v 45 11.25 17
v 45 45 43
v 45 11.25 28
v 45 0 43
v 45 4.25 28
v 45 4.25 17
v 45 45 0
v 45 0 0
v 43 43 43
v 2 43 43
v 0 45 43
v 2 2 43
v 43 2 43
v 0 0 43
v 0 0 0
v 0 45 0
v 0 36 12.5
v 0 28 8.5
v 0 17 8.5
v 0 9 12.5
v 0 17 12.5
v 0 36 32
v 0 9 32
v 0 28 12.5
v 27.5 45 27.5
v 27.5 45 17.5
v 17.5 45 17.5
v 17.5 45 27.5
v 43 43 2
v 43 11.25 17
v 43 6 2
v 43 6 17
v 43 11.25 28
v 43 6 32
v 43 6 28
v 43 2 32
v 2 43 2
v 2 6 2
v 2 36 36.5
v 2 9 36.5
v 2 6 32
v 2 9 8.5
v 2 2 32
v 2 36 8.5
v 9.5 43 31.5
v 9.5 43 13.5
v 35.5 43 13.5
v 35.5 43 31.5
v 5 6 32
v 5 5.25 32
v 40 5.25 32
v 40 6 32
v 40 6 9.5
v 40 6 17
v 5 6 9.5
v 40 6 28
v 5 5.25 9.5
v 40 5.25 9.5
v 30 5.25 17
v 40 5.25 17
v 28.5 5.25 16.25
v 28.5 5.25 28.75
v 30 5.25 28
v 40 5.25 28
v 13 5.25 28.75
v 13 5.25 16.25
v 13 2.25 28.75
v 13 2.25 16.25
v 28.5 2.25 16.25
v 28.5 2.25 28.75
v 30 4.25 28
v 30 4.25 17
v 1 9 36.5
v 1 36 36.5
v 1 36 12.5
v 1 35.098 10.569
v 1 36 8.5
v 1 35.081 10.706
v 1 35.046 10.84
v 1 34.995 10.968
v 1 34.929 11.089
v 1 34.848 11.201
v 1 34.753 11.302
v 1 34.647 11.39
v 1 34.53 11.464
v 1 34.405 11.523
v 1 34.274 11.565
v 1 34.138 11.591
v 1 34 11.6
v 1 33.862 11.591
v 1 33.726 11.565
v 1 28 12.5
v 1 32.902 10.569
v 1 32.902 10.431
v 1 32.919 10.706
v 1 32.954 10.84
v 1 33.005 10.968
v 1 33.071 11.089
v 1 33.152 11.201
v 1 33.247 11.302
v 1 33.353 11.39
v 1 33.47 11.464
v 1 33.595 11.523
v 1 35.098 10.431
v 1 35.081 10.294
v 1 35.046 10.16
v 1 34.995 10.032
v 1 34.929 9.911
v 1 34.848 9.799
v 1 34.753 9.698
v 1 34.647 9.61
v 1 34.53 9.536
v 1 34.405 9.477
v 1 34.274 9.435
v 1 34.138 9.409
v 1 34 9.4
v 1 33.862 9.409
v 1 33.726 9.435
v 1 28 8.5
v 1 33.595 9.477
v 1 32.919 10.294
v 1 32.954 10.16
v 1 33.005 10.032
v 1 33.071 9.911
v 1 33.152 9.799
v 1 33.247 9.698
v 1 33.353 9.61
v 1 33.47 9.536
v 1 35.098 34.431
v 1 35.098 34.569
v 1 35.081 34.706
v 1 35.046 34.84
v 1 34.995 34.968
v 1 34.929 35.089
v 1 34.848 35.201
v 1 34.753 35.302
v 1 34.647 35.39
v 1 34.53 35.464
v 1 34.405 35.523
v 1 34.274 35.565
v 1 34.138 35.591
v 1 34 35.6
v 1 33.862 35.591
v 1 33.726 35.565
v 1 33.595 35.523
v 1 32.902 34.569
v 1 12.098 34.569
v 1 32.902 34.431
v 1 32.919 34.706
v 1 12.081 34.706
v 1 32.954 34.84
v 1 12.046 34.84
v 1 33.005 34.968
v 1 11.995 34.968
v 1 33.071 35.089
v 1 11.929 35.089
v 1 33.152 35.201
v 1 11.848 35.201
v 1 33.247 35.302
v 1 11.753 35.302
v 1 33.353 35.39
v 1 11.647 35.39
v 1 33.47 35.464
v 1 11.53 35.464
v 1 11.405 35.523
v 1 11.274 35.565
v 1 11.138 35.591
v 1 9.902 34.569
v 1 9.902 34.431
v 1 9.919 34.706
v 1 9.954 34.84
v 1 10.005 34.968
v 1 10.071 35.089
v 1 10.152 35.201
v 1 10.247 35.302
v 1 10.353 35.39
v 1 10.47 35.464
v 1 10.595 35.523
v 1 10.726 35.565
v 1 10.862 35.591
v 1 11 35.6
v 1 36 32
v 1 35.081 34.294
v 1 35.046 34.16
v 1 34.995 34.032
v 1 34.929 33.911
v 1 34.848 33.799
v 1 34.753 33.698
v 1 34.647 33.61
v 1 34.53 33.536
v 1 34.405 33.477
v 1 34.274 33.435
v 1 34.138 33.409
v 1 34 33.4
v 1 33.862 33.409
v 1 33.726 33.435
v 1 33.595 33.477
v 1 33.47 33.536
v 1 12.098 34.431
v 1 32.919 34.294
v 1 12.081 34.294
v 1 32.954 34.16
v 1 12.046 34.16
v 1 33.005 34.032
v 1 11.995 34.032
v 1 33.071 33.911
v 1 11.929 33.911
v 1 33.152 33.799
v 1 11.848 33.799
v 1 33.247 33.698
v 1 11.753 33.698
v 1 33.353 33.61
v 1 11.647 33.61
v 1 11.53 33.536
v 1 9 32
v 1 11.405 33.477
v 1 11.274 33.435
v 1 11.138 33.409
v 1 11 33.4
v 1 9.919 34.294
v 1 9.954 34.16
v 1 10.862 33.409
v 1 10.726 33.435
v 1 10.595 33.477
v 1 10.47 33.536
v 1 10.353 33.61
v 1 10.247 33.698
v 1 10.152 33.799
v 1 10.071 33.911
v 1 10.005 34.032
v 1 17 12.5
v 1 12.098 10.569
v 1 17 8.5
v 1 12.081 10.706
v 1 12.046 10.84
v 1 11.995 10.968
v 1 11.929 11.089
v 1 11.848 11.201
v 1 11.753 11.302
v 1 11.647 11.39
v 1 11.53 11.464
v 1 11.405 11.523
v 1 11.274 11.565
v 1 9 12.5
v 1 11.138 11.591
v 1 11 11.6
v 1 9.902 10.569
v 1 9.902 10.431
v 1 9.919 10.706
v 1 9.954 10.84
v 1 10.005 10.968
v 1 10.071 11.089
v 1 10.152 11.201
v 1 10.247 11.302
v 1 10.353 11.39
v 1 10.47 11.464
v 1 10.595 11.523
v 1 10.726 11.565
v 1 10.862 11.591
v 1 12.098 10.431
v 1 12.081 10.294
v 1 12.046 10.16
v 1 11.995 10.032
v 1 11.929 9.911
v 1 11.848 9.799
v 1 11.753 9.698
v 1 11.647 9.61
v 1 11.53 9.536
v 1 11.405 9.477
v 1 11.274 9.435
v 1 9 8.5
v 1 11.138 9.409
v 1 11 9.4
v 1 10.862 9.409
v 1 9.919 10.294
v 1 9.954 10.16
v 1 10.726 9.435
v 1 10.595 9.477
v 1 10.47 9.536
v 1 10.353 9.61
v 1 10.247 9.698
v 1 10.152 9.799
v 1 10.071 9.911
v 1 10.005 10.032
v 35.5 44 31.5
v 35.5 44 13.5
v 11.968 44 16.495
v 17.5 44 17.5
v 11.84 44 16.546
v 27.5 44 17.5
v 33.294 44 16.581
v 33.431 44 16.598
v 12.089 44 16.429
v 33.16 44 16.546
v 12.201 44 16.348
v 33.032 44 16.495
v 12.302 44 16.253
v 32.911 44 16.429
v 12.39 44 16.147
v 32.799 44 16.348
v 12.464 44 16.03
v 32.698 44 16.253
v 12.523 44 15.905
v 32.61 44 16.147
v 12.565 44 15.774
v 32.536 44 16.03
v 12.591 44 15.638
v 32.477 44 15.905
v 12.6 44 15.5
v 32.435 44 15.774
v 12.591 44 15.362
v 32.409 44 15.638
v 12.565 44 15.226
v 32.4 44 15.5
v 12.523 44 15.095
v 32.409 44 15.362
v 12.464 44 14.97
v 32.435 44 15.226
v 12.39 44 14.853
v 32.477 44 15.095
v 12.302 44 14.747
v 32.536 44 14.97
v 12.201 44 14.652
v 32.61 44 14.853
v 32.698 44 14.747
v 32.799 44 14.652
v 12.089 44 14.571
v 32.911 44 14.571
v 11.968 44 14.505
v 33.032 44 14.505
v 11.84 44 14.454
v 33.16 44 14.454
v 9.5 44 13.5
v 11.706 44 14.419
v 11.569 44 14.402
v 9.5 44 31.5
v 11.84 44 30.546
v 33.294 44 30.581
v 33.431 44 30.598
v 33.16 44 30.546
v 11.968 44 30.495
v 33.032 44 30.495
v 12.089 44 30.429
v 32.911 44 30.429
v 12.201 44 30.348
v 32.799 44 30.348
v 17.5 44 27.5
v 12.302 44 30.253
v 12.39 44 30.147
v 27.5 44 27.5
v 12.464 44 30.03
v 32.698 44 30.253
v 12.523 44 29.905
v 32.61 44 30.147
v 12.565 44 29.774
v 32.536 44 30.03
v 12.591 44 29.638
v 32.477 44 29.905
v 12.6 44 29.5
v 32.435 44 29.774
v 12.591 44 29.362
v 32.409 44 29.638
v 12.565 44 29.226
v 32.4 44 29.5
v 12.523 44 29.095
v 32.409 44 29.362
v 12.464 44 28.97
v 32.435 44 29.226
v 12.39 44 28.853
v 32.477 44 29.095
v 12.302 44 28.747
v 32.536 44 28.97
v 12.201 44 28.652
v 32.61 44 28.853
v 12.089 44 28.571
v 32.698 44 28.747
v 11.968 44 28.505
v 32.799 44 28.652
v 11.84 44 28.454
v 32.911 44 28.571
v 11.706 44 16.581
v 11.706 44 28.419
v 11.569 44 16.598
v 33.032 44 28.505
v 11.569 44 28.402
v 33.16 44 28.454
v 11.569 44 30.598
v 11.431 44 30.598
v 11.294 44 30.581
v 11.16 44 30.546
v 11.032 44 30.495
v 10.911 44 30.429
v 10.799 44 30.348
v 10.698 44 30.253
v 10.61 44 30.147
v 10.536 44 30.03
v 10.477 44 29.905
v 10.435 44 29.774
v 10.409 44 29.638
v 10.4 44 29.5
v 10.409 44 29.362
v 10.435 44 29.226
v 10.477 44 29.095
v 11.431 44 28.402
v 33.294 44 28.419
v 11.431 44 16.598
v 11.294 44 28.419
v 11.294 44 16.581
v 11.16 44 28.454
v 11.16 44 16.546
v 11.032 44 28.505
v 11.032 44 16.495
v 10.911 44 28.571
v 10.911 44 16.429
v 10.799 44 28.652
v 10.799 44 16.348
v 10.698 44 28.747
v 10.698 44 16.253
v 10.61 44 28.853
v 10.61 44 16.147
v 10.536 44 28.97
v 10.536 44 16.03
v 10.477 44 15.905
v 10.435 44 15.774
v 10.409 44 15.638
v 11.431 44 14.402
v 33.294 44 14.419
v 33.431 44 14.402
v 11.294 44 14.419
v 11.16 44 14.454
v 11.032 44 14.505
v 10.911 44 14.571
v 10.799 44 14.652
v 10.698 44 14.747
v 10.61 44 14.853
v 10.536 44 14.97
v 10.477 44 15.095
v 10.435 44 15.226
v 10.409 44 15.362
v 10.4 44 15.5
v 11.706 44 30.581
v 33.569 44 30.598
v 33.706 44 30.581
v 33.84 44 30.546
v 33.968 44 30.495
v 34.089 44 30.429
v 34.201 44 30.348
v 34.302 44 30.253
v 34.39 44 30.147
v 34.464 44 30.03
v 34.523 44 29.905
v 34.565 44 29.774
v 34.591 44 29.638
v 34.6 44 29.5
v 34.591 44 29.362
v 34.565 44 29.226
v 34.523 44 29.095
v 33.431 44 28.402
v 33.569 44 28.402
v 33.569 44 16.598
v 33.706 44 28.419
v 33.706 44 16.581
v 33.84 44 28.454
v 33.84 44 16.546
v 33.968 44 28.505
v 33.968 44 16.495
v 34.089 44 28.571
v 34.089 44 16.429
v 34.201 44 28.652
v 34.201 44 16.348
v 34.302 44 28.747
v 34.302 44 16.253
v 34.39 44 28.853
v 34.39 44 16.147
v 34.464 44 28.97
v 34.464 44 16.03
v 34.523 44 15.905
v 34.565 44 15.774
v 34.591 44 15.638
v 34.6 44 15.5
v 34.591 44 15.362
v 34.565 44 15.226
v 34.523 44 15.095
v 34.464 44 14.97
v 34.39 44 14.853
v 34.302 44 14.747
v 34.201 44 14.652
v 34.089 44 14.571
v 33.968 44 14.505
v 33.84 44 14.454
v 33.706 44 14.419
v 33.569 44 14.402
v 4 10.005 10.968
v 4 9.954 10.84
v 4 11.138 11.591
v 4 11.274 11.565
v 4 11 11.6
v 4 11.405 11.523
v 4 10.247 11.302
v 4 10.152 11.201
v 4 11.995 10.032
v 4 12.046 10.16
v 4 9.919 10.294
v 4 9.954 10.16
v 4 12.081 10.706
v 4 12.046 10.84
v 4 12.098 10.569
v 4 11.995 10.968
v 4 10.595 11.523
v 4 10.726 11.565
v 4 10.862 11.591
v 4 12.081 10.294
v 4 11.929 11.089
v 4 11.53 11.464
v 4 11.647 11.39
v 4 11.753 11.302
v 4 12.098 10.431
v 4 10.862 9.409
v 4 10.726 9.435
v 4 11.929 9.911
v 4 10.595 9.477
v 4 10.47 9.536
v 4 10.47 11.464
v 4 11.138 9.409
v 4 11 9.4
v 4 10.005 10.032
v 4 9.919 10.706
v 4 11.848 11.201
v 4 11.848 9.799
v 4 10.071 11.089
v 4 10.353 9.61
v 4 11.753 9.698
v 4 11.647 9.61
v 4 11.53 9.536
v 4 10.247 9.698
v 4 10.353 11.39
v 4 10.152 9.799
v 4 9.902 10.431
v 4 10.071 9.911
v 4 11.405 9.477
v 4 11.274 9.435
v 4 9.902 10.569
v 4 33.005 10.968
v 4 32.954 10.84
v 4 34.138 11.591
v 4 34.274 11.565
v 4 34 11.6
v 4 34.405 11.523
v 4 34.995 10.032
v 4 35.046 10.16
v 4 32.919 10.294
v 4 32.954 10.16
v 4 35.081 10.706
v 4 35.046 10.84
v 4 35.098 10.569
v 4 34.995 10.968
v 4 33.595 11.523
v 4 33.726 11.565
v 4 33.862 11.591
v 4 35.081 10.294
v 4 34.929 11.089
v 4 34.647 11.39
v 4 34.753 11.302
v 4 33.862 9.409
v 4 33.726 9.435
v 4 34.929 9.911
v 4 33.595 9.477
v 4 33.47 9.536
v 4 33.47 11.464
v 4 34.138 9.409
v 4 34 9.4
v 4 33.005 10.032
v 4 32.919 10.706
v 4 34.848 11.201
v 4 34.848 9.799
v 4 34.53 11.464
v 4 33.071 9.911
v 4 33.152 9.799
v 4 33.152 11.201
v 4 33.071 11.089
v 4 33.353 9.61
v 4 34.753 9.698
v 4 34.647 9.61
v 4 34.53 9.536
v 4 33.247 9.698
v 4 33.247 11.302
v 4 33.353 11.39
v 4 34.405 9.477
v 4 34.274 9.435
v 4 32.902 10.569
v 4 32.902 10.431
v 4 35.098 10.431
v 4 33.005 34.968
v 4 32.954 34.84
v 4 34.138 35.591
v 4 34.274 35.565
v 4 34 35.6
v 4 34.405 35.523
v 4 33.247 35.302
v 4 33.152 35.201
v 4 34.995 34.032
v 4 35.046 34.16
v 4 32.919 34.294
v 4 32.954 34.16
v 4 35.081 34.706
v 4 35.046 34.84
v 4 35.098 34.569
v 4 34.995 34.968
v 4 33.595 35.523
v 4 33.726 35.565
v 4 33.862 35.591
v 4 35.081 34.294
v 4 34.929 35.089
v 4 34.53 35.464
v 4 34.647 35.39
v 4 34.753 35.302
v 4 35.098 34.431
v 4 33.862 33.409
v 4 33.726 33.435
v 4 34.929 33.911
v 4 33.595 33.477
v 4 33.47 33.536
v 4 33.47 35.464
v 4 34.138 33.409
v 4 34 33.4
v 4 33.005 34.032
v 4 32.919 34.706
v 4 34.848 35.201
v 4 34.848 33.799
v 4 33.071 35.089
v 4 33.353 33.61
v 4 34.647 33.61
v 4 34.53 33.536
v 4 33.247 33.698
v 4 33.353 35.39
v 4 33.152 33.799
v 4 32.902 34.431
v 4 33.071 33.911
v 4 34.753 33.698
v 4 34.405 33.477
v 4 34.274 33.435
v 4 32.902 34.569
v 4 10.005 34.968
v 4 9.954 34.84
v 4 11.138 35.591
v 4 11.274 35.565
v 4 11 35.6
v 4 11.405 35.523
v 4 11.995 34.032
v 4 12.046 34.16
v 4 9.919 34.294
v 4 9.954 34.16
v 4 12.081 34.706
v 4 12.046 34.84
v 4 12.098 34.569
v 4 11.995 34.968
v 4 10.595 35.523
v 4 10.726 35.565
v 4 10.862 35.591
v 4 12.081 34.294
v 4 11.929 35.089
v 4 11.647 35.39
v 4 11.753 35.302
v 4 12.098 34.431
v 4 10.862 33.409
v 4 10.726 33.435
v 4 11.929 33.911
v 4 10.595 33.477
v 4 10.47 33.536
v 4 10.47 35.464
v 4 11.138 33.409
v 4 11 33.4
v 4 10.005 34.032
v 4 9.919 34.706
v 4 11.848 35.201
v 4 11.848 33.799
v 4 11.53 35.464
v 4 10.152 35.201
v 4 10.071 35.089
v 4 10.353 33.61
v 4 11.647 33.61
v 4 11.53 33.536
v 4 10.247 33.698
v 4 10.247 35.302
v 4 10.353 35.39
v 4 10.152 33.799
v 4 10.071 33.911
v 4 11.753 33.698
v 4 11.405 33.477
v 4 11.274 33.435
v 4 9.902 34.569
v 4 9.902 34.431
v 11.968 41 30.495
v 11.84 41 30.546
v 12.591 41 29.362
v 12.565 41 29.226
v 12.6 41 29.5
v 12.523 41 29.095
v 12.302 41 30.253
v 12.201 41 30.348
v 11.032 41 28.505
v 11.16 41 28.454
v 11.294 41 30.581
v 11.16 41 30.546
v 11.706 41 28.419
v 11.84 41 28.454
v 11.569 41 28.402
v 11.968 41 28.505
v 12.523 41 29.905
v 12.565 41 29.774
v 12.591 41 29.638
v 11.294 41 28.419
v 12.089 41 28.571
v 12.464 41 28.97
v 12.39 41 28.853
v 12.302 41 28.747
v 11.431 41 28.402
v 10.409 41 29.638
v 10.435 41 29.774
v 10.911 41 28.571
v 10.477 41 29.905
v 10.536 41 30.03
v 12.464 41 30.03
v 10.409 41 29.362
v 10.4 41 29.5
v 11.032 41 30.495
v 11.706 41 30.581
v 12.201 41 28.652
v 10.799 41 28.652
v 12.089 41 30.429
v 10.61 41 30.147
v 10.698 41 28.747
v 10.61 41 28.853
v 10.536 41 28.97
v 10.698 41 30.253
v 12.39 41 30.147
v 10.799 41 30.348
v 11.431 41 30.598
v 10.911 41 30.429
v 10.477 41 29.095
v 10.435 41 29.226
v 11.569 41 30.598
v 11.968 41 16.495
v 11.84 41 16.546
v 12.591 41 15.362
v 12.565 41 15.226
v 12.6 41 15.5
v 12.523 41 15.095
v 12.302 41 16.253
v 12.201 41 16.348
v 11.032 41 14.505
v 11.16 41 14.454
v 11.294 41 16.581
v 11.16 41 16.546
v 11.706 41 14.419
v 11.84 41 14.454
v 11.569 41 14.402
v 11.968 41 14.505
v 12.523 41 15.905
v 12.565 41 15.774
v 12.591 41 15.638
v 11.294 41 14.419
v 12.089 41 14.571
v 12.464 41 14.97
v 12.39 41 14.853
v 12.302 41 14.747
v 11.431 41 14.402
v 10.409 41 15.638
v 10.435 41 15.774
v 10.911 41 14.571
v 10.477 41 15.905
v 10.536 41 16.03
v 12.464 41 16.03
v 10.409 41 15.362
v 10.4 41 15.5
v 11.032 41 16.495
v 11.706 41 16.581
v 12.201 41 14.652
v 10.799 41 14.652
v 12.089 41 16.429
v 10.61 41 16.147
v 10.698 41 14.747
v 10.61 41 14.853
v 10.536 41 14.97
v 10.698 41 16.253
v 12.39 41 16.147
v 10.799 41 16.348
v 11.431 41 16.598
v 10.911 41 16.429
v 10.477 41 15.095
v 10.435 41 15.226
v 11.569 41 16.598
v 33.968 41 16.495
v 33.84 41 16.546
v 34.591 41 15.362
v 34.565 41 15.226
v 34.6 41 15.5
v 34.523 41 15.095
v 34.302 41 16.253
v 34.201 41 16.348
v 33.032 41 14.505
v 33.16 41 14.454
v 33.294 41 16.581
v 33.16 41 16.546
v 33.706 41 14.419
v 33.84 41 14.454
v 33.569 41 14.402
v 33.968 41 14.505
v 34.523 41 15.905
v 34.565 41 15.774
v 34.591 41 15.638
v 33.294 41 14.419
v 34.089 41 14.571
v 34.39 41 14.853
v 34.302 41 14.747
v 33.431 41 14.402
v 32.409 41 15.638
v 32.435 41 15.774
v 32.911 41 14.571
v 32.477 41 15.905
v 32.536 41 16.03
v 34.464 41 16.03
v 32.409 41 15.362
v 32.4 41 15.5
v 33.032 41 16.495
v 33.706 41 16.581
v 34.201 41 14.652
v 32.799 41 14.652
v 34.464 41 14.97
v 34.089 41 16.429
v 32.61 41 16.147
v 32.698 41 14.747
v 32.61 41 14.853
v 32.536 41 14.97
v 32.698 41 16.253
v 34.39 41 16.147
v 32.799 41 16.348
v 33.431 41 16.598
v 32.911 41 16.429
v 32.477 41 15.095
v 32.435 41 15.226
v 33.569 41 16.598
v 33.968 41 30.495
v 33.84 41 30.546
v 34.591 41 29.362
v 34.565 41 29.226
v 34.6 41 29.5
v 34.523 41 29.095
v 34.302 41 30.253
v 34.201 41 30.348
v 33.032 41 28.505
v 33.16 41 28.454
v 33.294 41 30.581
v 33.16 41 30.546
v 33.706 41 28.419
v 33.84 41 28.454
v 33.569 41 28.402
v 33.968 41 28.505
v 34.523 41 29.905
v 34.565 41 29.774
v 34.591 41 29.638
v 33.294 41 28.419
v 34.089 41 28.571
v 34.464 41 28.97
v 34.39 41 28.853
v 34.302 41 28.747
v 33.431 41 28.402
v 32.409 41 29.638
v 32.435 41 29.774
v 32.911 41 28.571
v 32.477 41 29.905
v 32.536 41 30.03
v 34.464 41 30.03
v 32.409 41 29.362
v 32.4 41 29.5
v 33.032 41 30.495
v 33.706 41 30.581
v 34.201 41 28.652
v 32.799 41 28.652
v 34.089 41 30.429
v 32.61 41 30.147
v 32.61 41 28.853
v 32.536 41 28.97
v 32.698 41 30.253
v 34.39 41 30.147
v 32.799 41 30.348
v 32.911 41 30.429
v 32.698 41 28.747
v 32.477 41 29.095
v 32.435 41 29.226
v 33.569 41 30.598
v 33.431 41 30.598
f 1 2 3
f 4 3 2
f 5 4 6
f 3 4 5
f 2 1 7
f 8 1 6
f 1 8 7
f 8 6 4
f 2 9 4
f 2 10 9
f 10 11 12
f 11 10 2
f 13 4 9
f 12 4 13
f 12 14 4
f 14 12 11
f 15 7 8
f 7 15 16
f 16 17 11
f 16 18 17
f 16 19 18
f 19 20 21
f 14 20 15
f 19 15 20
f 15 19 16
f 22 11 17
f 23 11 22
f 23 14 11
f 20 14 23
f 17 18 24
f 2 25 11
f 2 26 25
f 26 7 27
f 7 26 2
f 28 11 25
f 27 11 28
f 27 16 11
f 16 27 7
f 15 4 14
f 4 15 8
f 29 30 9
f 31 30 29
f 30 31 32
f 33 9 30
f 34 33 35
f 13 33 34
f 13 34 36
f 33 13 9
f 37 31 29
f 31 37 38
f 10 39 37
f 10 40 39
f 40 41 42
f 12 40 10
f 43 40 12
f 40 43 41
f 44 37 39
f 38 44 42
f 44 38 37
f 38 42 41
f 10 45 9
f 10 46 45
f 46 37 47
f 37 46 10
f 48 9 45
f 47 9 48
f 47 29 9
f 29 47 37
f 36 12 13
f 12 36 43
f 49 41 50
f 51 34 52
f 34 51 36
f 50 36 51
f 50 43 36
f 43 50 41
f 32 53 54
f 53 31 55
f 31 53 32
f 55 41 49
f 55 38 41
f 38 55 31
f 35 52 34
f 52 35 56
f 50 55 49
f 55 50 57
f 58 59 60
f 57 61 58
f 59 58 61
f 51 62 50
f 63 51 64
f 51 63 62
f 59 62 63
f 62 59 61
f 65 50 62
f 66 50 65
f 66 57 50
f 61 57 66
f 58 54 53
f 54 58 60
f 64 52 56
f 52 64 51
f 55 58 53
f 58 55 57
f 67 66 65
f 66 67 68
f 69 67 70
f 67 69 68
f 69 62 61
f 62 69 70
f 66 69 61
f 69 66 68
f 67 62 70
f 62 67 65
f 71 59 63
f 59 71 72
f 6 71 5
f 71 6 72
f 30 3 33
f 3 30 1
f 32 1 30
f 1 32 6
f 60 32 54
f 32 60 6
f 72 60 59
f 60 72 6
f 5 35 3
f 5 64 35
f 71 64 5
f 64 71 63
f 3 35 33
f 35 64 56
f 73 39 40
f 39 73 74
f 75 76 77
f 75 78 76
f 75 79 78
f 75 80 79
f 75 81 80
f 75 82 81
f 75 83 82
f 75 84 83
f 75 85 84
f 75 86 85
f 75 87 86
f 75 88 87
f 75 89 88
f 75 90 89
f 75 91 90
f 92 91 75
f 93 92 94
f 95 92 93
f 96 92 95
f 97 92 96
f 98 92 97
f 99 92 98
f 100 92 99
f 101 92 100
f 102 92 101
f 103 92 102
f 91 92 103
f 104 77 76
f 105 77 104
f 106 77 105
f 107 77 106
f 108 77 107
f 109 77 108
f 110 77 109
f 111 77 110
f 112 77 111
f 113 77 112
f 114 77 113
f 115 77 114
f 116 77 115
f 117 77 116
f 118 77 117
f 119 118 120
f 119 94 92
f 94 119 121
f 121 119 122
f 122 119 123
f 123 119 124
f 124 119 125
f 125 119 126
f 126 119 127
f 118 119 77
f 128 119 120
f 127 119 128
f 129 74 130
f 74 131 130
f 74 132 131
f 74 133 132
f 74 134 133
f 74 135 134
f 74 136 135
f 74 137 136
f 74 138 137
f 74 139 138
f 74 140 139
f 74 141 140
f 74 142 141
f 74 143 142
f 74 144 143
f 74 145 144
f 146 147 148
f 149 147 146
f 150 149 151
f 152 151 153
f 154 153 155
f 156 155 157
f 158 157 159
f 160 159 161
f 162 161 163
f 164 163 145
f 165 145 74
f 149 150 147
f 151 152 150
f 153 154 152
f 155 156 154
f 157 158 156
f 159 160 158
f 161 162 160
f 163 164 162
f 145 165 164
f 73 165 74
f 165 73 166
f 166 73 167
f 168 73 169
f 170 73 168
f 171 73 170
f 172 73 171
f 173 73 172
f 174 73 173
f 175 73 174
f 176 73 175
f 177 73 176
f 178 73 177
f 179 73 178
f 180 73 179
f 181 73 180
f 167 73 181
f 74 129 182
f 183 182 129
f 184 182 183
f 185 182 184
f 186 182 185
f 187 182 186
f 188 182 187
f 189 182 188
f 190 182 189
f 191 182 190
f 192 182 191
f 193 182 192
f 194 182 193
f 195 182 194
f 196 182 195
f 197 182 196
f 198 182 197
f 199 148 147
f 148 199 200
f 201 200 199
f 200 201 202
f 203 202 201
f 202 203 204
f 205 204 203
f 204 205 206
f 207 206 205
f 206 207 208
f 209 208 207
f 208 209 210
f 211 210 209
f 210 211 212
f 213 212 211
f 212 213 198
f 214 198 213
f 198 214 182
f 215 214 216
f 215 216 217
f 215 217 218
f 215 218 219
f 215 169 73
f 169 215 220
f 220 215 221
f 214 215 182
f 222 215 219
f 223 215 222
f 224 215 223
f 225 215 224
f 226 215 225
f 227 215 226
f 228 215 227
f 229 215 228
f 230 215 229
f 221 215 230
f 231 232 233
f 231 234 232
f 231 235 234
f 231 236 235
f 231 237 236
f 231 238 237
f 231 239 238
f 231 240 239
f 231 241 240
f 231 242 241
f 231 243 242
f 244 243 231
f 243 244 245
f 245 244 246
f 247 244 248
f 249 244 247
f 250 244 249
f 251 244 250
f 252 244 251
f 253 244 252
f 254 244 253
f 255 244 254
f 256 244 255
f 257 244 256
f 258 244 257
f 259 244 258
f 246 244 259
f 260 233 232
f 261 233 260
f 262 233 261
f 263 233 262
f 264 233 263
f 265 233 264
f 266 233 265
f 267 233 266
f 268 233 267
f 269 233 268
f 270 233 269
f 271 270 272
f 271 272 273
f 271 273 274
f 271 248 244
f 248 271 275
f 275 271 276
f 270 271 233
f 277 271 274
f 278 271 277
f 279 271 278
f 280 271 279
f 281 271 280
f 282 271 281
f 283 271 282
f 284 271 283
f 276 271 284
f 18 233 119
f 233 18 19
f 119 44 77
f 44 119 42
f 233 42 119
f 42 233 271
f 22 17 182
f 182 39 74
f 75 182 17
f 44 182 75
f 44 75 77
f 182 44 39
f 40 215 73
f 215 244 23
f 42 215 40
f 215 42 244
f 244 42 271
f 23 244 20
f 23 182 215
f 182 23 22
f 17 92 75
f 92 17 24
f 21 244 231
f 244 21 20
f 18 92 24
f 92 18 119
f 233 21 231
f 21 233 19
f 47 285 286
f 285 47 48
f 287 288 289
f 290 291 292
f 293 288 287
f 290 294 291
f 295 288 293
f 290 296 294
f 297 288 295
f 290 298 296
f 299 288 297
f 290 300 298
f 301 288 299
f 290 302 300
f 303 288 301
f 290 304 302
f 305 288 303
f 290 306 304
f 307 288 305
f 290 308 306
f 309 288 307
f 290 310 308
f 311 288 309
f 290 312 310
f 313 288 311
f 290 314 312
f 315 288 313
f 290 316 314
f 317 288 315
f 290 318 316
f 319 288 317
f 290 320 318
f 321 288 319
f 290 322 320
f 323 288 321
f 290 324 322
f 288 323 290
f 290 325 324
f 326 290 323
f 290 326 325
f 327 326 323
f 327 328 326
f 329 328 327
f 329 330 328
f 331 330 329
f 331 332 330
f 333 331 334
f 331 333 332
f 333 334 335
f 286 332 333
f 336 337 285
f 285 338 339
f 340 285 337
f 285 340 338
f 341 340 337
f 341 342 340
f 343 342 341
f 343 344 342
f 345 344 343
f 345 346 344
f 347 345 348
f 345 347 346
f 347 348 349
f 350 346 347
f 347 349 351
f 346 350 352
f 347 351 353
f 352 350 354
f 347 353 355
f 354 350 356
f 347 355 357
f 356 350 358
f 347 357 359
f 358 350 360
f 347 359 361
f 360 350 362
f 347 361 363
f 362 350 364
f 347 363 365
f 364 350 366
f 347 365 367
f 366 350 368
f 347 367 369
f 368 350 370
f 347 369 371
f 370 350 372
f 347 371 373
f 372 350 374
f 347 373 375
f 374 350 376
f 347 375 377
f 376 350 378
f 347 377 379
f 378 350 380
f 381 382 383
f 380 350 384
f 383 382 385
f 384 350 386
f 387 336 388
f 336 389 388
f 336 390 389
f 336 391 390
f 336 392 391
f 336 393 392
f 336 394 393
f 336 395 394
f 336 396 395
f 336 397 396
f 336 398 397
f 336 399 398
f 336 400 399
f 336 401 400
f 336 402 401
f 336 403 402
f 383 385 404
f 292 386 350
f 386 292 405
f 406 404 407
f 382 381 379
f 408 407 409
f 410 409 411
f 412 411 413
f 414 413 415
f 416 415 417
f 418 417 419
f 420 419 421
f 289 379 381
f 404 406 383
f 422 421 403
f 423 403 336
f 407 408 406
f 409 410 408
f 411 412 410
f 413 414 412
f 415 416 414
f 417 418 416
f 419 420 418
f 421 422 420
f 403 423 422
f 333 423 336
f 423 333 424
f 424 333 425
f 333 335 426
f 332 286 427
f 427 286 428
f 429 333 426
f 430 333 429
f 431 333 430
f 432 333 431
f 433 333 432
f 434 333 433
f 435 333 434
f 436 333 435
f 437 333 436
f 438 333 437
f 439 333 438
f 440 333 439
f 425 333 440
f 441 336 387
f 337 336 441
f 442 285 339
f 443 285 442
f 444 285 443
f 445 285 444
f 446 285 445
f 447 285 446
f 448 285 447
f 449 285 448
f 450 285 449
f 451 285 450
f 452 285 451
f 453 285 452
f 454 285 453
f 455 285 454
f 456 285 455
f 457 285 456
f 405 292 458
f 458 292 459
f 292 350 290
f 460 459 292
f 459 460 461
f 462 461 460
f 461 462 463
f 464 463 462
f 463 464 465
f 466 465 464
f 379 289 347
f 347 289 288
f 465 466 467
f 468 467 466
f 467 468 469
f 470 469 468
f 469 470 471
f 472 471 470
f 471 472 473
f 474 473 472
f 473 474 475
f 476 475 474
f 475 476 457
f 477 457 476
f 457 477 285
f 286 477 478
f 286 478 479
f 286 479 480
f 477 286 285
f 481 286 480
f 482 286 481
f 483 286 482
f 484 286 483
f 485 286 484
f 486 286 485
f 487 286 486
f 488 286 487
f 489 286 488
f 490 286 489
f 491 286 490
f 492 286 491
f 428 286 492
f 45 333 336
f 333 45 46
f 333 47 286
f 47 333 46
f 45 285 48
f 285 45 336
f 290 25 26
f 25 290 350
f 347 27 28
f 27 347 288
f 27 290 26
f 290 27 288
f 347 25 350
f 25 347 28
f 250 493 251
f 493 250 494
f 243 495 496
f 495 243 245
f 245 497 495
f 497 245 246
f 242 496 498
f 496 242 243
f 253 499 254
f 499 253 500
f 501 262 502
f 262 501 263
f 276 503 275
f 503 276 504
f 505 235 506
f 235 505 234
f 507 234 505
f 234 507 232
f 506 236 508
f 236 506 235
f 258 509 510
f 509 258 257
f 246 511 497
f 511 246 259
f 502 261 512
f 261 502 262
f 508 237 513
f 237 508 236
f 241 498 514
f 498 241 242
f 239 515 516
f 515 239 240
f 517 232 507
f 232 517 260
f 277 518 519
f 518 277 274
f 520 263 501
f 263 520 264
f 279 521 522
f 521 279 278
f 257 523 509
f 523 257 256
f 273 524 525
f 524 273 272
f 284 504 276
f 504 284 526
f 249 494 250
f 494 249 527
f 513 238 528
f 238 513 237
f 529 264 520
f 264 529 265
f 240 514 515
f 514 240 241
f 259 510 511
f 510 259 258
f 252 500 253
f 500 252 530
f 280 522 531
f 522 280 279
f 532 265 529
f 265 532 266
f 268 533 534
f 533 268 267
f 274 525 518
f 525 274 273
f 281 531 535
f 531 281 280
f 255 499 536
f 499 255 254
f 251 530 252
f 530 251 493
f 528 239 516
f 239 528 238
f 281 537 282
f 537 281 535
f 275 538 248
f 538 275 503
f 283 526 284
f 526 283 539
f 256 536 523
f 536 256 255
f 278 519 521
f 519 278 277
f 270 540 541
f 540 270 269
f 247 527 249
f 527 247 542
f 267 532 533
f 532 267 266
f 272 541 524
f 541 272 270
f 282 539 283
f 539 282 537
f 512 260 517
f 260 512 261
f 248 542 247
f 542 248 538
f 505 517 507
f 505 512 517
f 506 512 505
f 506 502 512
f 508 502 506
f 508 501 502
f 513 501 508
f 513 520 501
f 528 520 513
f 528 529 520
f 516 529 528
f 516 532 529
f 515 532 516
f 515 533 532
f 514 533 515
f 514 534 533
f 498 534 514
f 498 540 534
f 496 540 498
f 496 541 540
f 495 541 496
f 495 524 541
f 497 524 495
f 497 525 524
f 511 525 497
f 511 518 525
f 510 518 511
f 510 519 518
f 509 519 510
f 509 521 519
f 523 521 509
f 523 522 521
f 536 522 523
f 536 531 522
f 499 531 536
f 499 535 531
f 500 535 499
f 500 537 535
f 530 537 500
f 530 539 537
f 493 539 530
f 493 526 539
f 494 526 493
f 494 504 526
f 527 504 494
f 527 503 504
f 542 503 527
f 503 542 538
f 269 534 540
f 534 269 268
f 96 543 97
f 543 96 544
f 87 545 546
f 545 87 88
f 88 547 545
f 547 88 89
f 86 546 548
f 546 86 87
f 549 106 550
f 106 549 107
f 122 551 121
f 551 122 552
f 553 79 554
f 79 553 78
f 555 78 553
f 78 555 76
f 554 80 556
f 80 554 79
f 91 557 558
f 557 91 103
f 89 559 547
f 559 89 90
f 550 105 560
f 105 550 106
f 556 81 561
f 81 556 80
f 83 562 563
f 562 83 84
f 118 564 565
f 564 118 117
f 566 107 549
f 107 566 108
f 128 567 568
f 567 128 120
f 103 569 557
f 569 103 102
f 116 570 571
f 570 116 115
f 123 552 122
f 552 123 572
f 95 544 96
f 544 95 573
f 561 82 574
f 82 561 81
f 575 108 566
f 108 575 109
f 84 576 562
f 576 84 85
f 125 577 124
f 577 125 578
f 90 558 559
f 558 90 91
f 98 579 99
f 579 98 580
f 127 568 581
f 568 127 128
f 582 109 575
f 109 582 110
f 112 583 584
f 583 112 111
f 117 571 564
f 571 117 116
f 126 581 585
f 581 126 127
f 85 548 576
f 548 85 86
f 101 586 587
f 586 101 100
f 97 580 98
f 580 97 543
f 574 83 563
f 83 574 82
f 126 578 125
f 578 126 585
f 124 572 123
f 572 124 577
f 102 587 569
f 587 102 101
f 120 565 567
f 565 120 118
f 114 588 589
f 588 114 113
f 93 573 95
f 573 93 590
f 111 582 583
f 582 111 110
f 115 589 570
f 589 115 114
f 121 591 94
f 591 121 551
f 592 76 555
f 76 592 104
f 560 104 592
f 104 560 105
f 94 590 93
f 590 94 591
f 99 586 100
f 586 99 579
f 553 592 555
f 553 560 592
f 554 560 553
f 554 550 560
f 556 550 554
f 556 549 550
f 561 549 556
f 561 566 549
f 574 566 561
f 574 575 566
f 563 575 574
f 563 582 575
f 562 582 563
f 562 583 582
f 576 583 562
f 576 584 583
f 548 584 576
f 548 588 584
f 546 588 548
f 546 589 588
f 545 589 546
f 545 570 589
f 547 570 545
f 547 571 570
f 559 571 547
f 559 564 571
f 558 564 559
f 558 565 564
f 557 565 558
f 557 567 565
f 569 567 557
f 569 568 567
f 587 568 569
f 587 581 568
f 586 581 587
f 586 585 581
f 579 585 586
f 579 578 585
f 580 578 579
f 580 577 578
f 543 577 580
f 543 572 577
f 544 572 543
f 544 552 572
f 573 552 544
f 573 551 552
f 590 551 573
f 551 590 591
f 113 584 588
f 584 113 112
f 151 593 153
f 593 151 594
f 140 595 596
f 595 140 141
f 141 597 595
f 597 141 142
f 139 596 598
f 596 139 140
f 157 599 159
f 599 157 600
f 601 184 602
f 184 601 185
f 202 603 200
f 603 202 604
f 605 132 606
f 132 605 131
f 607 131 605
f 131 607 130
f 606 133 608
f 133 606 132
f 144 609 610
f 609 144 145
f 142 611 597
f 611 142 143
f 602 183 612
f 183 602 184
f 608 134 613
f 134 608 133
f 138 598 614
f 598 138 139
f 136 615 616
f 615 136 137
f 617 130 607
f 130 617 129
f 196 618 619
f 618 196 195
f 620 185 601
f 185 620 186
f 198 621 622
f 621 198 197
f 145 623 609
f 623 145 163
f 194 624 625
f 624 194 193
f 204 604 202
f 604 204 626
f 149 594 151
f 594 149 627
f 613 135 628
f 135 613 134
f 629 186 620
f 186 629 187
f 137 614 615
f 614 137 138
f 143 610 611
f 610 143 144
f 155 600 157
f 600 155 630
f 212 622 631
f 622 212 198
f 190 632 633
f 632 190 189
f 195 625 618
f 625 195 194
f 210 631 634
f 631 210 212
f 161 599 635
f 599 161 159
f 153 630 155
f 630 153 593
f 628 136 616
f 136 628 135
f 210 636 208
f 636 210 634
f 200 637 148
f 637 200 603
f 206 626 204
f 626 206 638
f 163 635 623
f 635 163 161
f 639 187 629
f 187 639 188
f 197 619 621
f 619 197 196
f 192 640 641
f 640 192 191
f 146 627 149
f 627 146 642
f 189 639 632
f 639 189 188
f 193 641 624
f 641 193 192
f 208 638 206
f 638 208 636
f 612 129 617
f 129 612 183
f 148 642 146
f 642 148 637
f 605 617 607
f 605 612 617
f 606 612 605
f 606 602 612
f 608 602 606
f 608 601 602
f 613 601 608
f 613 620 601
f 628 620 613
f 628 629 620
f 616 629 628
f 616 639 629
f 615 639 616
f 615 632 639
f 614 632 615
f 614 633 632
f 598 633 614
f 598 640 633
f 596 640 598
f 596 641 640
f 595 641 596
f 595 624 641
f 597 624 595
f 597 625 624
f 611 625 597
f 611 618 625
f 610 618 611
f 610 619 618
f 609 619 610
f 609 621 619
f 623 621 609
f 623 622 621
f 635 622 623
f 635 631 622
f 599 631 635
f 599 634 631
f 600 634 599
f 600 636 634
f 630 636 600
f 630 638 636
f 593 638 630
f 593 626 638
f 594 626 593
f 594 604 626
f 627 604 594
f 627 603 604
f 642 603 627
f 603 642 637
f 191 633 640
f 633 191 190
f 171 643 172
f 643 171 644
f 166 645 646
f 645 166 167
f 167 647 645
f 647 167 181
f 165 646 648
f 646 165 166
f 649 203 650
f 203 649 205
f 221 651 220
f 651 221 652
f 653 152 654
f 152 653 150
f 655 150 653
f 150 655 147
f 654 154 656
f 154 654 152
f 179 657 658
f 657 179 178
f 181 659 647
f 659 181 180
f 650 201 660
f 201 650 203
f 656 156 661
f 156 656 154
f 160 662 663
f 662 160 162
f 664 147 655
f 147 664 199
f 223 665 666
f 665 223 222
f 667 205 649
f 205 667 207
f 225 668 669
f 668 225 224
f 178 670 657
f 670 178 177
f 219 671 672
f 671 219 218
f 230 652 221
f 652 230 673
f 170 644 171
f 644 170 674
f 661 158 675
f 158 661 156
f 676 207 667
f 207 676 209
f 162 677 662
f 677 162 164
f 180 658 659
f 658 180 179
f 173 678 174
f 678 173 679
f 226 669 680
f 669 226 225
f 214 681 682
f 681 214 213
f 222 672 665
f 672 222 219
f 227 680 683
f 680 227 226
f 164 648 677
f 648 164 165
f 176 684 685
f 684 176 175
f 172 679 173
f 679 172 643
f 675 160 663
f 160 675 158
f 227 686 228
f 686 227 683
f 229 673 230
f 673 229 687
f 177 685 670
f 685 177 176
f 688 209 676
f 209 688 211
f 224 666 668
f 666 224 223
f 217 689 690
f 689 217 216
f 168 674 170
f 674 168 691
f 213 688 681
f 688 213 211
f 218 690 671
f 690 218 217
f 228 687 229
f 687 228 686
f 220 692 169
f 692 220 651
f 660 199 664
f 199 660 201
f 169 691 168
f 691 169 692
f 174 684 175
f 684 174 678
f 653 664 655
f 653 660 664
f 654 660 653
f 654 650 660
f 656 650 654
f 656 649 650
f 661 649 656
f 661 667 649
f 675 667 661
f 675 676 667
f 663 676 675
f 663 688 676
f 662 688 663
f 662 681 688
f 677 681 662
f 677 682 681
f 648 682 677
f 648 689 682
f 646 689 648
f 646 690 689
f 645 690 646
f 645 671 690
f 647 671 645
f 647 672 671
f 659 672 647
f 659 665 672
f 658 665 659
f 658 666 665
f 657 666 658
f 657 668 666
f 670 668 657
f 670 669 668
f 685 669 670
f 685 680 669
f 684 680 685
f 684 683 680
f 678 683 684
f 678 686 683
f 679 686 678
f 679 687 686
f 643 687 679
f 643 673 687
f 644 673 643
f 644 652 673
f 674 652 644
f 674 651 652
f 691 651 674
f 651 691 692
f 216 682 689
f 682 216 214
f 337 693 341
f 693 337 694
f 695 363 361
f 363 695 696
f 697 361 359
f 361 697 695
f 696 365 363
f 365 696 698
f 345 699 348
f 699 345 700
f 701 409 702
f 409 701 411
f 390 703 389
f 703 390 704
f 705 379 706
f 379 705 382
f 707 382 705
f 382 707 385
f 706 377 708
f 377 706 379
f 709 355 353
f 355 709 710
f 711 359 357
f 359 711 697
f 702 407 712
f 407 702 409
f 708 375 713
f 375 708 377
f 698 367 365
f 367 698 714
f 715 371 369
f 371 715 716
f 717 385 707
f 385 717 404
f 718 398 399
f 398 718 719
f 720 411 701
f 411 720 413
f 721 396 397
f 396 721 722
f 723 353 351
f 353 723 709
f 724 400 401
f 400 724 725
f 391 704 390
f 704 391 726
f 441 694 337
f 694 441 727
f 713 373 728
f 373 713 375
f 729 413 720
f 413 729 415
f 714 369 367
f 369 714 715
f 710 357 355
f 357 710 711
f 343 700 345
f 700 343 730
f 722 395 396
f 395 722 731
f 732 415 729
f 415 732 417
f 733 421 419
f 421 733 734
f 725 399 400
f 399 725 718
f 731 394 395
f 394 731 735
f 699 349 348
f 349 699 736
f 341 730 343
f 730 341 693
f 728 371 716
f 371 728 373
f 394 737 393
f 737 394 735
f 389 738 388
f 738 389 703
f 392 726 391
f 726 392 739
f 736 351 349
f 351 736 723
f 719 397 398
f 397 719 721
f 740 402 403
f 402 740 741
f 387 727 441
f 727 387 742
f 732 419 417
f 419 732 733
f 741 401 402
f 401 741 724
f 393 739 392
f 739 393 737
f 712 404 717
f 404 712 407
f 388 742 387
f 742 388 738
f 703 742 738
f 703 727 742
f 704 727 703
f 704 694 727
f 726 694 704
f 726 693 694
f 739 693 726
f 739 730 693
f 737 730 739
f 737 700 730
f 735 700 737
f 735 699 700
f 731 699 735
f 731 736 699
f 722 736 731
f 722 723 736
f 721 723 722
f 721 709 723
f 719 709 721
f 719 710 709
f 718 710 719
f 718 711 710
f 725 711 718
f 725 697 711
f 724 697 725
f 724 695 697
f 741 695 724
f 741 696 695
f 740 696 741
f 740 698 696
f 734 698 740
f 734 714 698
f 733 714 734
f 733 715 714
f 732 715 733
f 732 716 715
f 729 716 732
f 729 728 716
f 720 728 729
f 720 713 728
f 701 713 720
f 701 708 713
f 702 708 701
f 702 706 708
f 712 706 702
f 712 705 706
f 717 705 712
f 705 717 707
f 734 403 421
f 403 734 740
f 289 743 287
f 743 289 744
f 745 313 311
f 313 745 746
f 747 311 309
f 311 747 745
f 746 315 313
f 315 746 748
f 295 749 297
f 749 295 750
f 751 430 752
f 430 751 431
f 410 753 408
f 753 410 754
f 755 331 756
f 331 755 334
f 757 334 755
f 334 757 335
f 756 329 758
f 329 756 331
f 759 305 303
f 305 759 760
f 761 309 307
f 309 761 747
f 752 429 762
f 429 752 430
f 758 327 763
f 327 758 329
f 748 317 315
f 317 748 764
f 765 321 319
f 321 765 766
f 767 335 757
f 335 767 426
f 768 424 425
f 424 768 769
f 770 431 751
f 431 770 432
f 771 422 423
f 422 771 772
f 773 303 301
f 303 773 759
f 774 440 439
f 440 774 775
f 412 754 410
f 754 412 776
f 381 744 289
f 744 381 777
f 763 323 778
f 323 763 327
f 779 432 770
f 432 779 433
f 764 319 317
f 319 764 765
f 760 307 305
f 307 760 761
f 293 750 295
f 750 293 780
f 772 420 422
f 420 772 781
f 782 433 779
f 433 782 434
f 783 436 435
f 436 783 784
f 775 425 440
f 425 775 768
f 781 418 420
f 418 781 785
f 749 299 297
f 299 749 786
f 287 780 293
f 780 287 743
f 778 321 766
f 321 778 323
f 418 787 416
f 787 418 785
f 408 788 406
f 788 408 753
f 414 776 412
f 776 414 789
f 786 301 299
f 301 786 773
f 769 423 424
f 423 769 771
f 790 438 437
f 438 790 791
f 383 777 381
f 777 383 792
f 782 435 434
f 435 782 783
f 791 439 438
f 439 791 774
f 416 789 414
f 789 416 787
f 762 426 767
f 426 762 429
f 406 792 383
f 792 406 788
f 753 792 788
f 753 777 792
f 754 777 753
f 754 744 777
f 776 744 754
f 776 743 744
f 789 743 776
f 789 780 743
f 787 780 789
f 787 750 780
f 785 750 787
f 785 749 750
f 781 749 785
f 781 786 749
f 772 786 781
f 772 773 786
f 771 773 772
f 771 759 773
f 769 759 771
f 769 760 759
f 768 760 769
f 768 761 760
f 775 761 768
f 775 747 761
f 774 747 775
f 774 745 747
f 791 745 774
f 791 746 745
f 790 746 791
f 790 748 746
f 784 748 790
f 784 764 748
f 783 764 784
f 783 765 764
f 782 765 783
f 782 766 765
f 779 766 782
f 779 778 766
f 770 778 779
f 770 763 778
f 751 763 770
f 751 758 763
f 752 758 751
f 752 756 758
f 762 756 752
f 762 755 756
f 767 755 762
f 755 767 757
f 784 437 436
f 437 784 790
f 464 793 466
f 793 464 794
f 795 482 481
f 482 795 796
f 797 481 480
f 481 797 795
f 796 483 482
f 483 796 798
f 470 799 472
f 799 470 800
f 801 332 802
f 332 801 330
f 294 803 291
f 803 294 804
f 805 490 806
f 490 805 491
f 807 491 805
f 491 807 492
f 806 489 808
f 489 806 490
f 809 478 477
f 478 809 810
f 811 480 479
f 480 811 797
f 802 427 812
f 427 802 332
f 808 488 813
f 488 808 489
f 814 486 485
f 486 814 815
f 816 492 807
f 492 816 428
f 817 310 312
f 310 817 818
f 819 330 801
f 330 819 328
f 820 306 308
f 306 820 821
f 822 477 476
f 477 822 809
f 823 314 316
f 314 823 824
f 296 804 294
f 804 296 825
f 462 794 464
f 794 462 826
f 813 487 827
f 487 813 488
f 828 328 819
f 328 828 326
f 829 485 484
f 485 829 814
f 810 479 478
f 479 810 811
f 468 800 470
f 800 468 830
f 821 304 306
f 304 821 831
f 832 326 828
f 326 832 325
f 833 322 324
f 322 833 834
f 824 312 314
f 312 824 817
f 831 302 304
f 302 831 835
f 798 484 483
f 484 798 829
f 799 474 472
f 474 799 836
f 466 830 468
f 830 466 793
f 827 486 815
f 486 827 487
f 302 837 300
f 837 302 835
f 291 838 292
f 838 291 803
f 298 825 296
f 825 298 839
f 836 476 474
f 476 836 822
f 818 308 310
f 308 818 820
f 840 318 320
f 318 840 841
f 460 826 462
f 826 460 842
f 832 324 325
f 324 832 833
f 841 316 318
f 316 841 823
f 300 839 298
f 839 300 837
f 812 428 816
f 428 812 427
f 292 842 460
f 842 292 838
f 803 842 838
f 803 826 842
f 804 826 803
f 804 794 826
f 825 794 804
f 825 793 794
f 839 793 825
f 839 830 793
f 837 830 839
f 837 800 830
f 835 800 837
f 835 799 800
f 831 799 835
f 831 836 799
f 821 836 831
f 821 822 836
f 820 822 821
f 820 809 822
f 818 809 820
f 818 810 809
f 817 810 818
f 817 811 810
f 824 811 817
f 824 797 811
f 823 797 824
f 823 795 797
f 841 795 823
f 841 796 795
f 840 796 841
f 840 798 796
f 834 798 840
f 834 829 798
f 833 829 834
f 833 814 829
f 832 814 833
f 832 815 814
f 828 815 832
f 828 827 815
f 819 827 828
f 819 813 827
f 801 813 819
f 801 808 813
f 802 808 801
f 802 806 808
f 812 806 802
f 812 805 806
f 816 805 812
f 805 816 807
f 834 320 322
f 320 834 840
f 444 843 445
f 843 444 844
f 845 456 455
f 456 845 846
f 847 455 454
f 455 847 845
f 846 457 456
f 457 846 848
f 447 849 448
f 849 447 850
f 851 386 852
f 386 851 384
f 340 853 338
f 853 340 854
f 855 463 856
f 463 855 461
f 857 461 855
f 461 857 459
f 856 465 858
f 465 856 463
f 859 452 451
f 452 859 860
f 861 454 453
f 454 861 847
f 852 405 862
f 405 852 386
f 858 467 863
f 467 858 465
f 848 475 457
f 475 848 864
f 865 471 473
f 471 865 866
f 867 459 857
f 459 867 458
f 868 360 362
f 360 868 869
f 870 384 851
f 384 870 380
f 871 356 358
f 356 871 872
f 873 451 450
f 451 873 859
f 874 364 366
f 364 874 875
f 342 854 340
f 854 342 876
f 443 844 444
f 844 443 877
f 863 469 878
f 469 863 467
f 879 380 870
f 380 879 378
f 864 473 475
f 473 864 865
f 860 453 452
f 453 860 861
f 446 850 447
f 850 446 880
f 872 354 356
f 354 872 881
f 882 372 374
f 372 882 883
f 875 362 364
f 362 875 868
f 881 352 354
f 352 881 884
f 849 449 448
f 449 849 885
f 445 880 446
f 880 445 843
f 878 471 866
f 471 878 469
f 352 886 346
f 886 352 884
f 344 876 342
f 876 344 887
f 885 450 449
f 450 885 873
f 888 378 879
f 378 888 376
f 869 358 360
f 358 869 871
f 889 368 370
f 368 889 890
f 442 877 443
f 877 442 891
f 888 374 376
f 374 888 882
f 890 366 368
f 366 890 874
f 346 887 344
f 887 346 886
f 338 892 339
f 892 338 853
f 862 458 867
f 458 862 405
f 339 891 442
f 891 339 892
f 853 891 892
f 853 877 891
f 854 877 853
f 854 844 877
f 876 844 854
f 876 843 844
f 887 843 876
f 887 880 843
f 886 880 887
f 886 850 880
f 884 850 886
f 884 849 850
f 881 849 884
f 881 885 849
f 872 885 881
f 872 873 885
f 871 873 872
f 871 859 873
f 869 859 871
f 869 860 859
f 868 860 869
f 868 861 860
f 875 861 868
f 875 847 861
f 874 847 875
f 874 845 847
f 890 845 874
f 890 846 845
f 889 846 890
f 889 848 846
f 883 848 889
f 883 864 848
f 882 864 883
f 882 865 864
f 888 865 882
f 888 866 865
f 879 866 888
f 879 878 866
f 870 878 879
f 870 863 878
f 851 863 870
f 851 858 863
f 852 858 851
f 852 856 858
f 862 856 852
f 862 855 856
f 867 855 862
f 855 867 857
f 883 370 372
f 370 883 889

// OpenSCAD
$fn=50;
length=45;
thickness=2;

module box_bottom(size=length, thickness=thickness) {
    difference() {
        cube([size, size, size-thickness]);
        translate([thickness, thickness, thickness])
            cube([size-2*thickness, size-2*thickness, size]);
    }
}

module box_top(size=length, thickness=thickness) {
    cube([size, size, thickness]);
    translate([thickness, thickness, thickness-.01])
        cube([size-2*thickness, size-2*thickness, thickness]);
}


module box_assembled(size=length, thickness=thickness) {
    %box_bottom();
    translate([0,0,length])
    rotate(a=180, v=[1,1,0])
        box_top();
}

module d1_mini() {
    // main pcb
    cube([35, 26, 4], center=true);
    // wifi shield
    translate([1.75, 0, 3.5])
        cube([15.5, 12.5, 3], center=true);
    // usb power
    translate([-17.5,0, -0.5])
        cube([20, 11, 7], center=true);
}

// cutout=true to subtract from box to make space.
// cutout=false to add to box.
module display(cutout = true) {
    if (cutout) {
        cube([28,27,1]);
        translate([4, 0, 0])
            cube([19.5, 27, 5]);
        translate([0, (27-11)/2, 0])
            cube([5, 11, 5]);
    } else {
        translate([2,2,-2])
            cylinder(h=3, r=1.1);
        translate([2,25,-2])
            cylinder(h=3, r=1.1);
        translate([26,25,-2])
            cylinder(h=3, r=1.1);
        translate([26,2,-2])
            cylinder(h=3, r=1.1);
    }
}

module sensor(cutout = true) {
    if (cutout) {
        cube([26,18,1]);
        translate([8, 4, 1])
            cube([10, 10, 5]);
    } else {
        translate([2,2,-2])
            cylinder(h=3, r=1.1);
        translate([2,16,-2])
            cylinder(h=3, r=1.1);
        translate([24,16,-2])
            cylinder(h=3, r=1.1);
        translate([24,2,-2])
            cylinder(h=3, r=1.1);
    }
}

module main() {
    difference() {
        union() {
            box_bottom();
            cube([length, thickness+4, length-13]);
        }
        translate([length/2, thickness+3.5+1+.75, length/2])
        rotate(a=180, v=[0,1,0])
        rotate(a=90, v=[1,0,0])
            d1_mini();
        translate([thickness, (length-27)/2, (length-28)/2])
        rotate(a=-90, v=[0,1,0])
            display(cutout=true);
        translate([(length-26)/2, length-thickness, length-13.5])
        rotate(a=90, v=[-11,0,0])
            sensor(cutout=true);
    }
    translate([thickness, (length-27)/2, (length-28)/2])
    rotate(a=-90, v=[0,1,0])
        display(cutout=false);
    translate([(length-26)/2, length-thickness, length-13.5])
    rotate(a=90, v=[-11,0,0])
        sensor(cutout=false);
}

main();
//sensor(cutout=false);
